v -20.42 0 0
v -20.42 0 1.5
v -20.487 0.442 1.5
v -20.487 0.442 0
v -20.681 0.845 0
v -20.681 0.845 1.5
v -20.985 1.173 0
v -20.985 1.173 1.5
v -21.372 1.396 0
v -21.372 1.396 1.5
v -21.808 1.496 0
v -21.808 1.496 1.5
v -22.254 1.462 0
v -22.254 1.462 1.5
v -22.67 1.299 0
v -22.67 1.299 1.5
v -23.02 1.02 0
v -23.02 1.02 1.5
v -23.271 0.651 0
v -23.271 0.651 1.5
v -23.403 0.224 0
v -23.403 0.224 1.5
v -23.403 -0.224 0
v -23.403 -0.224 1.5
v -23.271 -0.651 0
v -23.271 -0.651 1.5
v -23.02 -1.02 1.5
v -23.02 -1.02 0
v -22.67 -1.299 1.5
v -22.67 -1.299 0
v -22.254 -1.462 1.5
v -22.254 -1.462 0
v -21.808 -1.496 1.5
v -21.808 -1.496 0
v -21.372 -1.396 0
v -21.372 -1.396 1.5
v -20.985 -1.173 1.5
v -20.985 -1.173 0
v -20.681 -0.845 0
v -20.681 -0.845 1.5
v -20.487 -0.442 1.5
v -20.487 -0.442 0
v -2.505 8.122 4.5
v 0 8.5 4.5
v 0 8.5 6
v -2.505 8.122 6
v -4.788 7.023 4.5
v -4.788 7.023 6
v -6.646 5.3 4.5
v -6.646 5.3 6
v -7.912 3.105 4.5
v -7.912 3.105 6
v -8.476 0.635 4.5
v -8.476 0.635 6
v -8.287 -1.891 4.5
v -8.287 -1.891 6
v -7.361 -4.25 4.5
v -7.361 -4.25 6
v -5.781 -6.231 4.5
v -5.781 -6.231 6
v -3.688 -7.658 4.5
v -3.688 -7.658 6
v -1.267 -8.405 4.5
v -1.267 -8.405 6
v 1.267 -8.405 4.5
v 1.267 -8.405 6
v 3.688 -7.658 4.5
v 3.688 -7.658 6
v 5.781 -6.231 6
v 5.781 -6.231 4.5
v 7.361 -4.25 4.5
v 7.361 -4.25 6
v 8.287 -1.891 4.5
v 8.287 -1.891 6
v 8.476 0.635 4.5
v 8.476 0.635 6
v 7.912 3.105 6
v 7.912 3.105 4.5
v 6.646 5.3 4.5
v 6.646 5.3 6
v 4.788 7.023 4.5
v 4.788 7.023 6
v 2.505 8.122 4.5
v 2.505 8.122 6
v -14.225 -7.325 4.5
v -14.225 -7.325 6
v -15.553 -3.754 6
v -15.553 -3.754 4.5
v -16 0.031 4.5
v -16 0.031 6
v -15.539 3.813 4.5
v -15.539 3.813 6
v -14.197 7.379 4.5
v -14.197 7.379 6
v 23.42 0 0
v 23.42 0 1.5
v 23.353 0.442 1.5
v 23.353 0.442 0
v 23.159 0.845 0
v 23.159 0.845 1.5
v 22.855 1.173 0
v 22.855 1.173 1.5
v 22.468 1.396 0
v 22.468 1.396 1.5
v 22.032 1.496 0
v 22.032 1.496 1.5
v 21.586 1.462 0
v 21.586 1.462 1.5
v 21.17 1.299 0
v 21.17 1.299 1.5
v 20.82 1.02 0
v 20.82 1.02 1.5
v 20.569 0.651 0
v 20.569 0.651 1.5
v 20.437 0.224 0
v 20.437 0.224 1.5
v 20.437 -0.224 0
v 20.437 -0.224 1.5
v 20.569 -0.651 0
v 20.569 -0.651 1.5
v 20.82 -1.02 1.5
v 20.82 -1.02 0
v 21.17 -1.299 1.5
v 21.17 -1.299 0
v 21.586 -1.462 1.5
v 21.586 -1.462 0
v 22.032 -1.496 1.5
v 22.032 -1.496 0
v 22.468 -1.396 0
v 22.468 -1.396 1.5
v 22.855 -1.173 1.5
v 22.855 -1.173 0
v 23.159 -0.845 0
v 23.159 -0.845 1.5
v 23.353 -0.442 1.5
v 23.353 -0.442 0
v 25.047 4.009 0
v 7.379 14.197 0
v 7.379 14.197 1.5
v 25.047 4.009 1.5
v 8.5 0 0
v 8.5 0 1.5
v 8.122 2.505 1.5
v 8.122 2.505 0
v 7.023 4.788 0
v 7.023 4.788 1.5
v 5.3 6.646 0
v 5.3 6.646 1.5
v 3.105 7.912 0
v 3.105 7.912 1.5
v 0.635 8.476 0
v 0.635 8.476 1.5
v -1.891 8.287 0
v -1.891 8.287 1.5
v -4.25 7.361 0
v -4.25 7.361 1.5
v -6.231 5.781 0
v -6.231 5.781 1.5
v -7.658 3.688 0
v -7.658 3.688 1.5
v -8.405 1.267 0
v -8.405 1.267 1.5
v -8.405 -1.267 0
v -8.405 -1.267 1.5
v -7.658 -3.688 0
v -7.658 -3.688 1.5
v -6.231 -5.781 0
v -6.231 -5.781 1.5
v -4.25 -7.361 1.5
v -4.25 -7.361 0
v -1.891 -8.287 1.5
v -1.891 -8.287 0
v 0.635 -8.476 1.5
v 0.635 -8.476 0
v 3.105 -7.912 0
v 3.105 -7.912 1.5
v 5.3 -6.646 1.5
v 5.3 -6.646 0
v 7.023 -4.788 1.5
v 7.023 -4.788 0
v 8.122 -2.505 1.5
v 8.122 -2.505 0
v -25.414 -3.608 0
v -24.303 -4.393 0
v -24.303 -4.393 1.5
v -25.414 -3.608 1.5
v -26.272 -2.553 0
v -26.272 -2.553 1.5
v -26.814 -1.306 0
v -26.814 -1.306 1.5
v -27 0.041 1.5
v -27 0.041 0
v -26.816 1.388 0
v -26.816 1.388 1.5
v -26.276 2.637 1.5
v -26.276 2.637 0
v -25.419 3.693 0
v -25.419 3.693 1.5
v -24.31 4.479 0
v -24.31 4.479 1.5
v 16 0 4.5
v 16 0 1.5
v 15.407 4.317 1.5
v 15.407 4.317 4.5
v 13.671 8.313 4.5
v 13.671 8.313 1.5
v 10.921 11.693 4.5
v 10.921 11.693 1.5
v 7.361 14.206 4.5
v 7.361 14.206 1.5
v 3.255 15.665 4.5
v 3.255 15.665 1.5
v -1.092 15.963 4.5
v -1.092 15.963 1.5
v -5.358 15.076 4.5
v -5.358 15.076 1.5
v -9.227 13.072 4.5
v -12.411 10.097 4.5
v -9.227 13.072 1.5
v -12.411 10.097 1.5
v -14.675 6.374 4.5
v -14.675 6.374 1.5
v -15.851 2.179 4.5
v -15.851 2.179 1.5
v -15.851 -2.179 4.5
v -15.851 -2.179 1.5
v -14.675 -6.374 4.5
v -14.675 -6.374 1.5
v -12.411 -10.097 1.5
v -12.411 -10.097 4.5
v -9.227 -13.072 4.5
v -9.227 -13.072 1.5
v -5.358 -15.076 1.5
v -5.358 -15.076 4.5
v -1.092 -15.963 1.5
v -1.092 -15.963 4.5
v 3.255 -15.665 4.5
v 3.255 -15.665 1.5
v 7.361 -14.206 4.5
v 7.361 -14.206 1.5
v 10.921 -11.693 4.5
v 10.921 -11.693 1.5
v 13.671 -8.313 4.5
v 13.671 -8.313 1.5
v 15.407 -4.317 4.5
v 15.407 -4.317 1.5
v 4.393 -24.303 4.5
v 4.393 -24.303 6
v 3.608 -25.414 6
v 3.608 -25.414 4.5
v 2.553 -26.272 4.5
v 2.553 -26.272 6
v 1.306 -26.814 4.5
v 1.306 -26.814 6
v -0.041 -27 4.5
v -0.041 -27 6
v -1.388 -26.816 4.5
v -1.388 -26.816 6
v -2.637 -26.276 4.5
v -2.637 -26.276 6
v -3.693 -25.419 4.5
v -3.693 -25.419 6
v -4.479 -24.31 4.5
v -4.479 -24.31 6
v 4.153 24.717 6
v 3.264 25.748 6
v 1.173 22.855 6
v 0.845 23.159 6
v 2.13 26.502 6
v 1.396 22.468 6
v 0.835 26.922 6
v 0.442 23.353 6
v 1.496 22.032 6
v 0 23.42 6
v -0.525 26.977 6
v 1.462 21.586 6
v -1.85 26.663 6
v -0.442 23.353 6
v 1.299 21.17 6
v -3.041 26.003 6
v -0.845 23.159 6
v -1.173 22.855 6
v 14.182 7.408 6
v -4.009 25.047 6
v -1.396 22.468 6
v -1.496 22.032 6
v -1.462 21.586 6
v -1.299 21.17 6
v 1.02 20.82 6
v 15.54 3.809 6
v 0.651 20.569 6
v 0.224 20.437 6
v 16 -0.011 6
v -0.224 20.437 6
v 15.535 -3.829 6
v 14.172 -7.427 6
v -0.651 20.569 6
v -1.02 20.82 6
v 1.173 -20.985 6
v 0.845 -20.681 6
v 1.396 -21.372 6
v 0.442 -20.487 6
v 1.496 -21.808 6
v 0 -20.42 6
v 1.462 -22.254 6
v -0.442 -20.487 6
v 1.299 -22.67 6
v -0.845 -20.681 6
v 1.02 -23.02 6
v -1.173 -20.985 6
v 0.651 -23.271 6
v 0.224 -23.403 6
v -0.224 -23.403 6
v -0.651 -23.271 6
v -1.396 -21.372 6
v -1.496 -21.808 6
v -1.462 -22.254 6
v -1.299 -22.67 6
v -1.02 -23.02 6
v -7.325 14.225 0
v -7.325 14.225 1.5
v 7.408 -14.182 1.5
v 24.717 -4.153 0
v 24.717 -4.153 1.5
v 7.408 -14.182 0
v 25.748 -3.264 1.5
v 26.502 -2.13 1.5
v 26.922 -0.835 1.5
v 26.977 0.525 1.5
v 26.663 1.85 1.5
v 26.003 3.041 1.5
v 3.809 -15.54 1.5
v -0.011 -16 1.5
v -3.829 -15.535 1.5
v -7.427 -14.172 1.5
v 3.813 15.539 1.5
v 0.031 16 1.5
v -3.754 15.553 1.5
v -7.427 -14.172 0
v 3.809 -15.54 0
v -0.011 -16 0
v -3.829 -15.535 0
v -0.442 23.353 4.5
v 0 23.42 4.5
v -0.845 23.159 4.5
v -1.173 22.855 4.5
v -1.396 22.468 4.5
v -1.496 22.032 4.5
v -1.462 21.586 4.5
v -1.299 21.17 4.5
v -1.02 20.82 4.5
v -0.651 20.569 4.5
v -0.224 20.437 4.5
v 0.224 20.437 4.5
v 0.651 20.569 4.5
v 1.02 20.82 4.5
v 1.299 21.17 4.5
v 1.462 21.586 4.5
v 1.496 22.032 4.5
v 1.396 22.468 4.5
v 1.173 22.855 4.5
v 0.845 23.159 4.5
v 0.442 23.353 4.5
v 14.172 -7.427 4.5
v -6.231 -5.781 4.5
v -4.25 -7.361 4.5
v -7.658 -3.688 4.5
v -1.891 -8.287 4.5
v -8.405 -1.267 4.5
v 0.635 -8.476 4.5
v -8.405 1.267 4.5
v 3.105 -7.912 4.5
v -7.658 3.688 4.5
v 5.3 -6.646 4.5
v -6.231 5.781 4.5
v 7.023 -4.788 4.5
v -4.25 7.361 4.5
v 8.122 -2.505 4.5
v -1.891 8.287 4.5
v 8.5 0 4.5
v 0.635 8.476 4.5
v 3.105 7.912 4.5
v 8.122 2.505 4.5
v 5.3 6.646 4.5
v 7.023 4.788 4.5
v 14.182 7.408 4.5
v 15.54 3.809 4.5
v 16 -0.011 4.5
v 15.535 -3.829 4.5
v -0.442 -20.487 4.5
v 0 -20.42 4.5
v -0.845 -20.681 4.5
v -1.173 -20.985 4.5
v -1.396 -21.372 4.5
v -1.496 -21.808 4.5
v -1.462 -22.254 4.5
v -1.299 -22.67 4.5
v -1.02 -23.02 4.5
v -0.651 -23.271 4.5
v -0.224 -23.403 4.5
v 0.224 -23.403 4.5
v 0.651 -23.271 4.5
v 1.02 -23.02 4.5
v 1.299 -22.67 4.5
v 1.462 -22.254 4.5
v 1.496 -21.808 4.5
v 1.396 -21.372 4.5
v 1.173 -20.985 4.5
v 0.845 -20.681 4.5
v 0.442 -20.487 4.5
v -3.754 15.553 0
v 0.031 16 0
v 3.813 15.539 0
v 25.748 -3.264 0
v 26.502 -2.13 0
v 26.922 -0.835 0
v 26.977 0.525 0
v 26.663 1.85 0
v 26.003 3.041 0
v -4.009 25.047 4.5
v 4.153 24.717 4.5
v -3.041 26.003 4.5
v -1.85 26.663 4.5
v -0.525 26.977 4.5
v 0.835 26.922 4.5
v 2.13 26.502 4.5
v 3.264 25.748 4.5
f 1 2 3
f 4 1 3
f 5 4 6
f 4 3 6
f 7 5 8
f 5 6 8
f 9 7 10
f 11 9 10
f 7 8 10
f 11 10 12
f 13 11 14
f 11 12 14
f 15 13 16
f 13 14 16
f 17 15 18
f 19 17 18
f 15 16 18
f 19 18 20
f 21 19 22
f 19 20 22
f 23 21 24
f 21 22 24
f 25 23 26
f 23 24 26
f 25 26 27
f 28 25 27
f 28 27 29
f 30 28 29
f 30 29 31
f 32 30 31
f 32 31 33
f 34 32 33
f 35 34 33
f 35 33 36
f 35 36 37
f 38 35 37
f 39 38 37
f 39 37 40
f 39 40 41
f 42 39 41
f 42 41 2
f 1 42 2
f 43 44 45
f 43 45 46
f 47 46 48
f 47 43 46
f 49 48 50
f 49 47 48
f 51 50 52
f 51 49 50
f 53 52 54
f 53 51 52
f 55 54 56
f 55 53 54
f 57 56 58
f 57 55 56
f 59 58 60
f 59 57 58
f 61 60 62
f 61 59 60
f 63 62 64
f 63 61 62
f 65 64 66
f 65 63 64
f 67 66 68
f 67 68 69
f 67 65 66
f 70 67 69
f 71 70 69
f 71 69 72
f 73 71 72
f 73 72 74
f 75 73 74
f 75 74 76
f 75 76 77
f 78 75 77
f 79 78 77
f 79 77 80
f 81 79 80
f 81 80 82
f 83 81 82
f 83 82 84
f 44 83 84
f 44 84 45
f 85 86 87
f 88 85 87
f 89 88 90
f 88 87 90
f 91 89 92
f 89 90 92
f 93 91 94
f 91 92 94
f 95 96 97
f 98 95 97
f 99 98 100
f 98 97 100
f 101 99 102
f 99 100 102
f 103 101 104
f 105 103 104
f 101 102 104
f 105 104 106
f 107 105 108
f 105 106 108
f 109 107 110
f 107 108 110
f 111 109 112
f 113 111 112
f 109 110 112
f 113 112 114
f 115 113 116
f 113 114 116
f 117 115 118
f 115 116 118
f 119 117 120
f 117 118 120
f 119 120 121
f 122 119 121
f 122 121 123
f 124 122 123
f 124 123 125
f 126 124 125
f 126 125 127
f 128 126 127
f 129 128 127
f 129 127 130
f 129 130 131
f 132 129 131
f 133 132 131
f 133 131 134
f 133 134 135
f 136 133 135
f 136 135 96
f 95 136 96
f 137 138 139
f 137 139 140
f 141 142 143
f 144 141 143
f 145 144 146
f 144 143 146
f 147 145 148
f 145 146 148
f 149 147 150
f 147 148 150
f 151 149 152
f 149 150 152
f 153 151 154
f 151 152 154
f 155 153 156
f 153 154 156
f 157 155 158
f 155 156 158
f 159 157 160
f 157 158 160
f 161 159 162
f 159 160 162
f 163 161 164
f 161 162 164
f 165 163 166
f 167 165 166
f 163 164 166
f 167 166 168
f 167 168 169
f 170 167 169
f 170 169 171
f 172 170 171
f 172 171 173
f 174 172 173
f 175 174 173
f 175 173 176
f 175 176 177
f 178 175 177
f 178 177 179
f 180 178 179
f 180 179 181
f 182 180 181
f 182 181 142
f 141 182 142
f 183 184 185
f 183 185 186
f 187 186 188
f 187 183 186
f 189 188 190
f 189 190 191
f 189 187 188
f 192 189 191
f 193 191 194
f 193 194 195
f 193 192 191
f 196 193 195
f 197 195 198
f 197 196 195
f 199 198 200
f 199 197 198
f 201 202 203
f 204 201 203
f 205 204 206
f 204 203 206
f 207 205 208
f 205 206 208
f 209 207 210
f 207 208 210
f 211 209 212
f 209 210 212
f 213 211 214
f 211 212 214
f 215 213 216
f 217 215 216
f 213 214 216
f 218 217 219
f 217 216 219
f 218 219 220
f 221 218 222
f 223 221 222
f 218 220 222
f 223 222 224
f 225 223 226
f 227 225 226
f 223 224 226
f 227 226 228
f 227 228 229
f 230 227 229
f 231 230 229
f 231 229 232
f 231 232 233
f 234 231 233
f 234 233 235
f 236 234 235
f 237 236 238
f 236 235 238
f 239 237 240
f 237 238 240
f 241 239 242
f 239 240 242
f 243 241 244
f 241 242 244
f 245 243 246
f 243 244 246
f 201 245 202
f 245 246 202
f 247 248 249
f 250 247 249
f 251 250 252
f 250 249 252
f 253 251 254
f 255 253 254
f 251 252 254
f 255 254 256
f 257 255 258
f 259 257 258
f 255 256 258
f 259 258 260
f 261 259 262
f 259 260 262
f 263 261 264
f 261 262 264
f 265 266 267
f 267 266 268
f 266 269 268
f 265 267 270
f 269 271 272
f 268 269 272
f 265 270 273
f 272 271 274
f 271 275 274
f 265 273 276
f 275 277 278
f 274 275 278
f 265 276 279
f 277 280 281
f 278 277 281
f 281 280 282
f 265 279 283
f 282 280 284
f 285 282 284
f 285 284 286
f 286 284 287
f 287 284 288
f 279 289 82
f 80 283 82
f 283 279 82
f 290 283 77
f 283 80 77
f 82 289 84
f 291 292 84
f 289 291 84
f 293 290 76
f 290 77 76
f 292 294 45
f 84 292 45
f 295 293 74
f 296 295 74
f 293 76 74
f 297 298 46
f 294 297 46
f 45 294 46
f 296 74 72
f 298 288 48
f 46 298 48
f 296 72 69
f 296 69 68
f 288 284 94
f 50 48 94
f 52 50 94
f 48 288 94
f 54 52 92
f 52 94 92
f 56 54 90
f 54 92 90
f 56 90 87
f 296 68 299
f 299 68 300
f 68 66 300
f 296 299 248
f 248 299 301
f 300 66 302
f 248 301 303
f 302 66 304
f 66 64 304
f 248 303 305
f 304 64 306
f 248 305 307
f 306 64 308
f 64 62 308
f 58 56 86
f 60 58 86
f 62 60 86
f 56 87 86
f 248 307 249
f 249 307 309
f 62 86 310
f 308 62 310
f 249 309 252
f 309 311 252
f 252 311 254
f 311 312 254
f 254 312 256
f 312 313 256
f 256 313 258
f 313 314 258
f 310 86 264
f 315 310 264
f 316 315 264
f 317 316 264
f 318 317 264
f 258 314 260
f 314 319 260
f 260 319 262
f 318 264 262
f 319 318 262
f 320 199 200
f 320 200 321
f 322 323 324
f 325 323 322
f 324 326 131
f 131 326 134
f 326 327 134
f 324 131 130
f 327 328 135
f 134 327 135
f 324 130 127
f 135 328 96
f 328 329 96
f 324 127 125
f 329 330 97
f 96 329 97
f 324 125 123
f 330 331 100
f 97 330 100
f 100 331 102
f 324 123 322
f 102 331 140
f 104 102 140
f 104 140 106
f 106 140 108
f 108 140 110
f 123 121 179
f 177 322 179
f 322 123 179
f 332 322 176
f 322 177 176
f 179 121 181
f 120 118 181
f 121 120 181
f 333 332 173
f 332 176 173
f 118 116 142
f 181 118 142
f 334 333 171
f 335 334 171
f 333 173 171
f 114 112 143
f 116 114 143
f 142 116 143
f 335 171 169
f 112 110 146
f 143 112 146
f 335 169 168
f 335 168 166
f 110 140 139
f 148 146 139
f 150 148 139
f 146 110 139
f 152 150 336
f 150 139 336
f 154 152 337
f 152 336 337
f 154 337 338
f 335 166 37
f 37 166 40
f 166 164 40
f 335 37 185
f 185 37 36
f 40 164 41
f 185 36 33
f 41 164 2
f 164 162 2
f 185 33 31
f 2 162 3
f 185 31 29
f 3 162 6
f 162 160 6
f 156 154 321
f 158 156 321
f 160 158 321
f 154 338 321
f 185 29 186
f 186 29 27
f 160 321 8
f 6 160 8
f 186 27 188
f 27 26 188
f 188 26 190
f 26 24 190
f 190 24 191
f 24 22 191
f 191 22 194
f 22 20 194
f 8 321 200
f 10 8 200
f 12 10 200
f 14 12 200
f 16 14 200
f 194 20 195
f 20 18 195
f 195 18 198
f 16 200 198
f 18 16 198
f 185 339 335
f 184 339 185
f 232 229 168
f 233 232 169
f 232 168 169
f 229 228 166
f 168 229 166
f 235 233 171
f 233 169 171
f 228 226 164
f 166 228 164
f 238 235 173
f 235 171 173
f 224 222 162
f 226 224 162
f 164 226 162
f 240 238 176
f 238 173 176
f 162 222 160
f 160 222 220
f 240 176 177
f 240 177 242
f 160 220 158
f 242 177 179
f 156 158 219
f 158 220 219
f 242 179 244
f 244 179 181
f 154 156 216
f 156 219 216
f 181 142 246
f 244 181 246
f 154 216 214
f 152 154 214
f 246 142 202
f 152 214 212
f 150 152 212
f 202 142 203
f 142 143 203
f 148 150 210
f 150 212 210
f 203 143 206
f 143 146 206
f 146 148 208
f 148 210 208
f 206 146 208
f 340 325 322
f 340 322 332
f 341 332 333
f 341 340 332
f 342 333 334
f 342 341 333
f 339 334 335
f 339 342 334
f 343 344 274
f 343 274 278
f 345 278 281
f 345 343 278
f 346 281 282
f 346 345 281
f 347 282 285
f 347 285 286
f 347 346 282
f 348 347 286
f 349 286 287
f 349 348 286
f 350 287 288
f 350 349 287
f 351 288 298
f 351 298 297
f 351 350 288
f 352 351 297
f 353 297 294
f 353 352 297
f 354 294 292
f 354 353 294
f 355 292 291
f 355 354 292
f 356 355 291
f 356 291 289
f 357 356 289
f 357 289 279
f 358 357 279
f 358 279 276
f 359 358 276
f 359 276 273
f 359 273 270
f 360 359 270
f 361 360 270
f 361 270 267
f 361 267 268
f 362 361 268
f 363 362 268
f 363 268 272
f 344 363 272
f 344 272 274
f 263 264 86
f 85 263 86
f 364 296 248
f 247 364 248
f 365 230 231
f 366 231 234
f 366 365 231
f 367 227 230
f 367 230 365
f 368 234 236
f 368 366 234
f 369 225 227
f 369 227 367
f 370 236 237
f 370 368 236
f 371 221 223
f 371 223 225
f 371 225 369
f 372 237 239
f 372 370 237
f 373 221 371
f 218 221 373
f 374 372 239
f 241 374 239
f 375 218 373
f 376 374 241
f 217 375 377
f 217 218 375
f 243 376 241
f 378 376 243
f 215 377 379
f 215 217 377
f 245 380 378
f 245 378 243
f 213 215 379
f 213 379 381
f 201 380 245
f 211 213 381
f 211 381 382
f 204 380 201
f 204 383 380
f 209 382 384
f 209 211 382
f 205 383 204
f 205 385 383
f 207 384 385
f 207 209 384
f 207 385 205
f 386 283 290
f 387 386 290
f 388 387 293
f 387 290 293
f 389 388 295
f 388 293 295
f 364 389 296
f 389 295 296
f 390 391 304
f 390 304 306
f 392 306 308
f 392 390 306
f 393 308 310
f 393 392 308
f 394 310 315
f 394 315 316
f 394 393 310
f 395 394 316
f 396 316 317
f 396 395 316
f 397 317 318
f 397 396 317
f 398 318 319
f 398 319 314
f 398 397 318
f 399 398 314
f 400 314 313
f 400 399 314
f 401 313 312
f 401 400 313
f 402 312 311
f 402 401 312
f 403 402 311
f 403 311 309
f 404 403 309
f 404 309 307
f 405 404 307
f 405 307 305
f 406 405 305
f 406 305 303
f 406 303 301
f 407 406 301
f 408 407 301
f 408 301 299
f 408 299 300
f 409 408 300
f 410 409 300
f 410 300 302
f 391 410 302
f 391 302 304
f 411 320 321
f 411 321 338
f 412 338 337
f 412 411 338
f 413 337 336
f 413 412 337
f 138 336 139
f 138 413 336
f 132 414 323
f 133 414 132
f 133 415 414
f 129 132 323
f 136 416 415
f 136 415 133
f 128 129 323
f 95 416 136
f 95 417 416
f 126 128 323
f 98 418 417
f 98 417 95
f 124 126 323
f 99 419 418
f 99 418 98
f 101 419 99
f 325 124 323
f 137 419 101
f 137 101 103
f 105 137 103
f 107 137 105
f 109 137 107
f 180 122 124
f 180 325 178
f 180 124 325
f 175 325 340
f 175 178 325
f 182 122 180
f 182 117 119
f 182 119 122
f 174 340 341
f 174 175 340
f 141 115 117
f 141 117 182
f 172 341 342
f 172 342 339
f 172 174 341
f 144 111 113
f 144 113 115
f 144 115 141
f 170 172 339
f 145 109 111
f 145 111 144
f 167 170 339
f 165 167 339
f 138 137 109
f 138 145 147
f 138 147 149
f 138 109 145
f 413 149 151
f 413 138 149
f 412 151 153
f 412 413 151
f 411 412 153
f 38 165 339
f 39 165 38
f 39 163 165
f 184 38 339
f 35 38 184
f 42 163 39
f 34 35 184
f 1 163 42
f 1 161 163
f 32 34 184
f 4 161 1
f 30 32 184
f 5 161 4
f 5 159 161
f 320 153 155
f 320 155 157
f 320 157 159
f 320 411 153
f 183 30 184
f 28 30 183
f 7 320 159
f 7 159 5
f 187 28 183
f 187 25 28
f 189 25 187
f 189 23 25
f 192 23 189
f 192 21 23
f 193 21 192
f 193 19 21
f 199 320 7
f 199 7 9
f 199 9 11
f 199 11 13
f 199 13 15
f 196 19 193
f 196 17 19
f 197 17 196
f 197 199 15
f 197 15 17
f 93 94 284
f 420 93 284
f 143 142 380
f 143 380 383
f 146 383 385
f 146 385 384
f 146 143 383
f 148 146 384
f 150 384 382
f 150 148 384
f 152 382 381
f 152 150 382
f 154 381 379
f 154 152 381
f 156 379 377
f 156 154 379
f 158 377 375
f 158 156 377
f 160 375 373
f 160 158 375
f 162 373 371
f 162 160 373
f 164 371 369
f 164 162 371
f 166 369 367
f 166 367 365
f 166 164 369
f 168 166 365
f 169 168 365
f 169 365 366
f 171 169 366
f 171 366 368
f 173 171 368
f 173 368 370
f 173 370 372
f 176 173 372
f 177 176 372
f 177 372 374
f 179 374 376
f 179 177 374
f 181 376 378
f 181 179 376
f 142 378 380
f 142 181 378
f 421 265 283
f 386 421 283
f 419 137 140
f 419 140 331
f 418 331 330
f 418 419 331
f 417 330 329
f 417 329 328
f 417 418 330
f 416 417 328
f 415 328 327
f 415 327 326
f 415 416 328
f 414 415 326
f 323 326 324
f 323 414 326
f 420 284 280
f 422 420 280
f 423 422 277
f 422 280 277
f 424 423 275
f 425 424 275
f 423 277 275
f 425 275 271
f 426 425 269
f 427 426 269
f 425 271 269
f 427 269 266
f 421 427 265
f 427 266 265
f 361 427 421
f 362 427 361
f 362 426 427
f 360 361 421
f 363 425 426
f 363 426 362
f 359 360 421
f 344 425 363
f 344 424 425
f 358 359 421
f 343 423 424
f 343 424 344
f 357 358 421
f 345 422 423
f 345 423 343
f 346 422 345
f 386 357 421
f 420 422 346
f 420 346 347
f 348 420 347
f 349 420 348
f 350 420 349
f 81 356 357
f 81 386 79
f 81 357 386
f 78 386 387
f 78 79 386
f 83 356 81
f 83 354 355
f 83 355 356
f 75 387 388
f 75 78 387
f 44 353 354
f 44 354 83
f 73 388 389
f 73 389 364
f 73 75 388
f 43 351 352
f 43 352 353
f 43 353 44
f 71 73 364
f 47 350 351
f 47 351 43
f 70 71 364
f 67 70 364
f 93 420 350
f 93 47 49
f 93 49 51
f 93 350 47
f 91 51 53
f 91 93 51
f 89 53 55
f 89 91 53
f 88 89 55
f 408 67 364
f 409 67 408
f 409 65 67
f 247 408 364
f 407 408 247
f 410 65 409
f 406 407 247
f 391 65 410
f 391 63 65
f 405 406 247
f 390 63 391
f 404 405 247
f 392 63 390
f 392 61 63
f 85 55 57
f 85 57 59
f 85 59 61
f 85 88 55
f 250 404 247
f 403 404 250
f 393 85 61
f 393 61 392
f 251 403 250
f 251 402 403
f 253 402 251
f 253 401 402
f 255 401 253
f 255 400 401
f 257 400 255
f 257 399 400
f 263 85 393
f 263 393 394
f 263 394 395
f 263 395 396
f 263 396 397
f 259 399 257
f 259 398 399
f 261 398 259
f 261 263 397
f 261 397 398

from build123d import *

# Parameters (mm, degrees)
BOSS_EXTRUDE1_DEPTH      = 1.5
SKETCH2_R                = 1.5
SKETCH2_R_2              = 8.5
CUT_EXTRUDE1_DEPTH       = 32.420495375
BODY_MOVE_COPY1_ANGLE    = 90
BOSS_EXTRUDE2_DEPTH      = 1.5
BOSS_EXTRUDE2_DEPTH_BACK = 1.5
SKETCH3_R                = 16
SKETCH3_R_2              = 8.5


with BuildPart() as part:
    # Sketch1 → Boss-Extrude1 (new body)
    with BuildSketch(Plane.XY):
        with BuildLine():
            Line((7.379381976, 14.196644732), (25.046611975, 4.009443432))
            ThreePointArc((25.046611975, 4.009443432), (26.995880172, -0.156936678), (24.716922459, -4.152524428))
            Line((24.716922459, -4.152524428), (7.407985651, -14.181739971))
            ThreePointArc((7.407985651, -14.181739971), (-0.010581597, -15.999996501), (-7.426737349, -14.171929027))
            Line((-7.426737349, -14.171929027), (-24.302900872, -4.393201109))
            ThreePointArc((-24.302900872, -4.393201109), (-26.99995272, 0.040951738), (-24.309846191, 4.479321596))
            Line((-24.309846191, 4.479321596), (-7.325019927, 14.224770053))
            ThreePointArc((-7.325019927, 14.224770053), (0.030603374, 15.999970732), (7.379381976, 14.196644732))
        make_face()
    extrude(amount=BOSS_EXTRUDE1_DEPTH)

    # Sketch2 → Cut-Extrude1 (cut, through all)
    with BuildSketch(Plane.XY.offset(1.5)):
        with Locations((-21.92, 0)):
            Circle(SKETCH2_R)
        with Locations((21.92, 0)):
            Circle(SKETCH2_R)
        Circle(SKETCH2_R_2)
    extrude(amount=-CUT_EXTRUDE1_DEPTH, mode=Mode.SUBTRACT)


with BuildPart() as body_2:
    # Mirror2: mirrored copy
    add(part.part.mirror(Plane.XY.offset(3)))


with BuildPart() as body_2_1:
    # Body-Move/Copy1: moved
    add(body_2.part.rotate(Axis((0, 0, 0), (0, 0, 1)), BODY_MOVE_COPY1_ANGLE))


with BuildPart() as body_3:
    # Sketch3 → Boss-Extrude2 (new, two sides: drawn at the far end of the back side and taken through both)
    with BuildSketch(Plane.XY.offset(3).offset(-BOSS_EXTRUDE2_DEPTH_BACK)):
        Circle(SKETCH3_R)
        Circle(SKETCH3_R_2, mode=Mode.SUBTRACT)
    extrude(amount=BOSS_EXTRUDE2_DEPTH + BOSS_EXTRUDE2_DEPTH_BACK)


solid = Compound([part.part, body_2_1.part, body_3.part])
